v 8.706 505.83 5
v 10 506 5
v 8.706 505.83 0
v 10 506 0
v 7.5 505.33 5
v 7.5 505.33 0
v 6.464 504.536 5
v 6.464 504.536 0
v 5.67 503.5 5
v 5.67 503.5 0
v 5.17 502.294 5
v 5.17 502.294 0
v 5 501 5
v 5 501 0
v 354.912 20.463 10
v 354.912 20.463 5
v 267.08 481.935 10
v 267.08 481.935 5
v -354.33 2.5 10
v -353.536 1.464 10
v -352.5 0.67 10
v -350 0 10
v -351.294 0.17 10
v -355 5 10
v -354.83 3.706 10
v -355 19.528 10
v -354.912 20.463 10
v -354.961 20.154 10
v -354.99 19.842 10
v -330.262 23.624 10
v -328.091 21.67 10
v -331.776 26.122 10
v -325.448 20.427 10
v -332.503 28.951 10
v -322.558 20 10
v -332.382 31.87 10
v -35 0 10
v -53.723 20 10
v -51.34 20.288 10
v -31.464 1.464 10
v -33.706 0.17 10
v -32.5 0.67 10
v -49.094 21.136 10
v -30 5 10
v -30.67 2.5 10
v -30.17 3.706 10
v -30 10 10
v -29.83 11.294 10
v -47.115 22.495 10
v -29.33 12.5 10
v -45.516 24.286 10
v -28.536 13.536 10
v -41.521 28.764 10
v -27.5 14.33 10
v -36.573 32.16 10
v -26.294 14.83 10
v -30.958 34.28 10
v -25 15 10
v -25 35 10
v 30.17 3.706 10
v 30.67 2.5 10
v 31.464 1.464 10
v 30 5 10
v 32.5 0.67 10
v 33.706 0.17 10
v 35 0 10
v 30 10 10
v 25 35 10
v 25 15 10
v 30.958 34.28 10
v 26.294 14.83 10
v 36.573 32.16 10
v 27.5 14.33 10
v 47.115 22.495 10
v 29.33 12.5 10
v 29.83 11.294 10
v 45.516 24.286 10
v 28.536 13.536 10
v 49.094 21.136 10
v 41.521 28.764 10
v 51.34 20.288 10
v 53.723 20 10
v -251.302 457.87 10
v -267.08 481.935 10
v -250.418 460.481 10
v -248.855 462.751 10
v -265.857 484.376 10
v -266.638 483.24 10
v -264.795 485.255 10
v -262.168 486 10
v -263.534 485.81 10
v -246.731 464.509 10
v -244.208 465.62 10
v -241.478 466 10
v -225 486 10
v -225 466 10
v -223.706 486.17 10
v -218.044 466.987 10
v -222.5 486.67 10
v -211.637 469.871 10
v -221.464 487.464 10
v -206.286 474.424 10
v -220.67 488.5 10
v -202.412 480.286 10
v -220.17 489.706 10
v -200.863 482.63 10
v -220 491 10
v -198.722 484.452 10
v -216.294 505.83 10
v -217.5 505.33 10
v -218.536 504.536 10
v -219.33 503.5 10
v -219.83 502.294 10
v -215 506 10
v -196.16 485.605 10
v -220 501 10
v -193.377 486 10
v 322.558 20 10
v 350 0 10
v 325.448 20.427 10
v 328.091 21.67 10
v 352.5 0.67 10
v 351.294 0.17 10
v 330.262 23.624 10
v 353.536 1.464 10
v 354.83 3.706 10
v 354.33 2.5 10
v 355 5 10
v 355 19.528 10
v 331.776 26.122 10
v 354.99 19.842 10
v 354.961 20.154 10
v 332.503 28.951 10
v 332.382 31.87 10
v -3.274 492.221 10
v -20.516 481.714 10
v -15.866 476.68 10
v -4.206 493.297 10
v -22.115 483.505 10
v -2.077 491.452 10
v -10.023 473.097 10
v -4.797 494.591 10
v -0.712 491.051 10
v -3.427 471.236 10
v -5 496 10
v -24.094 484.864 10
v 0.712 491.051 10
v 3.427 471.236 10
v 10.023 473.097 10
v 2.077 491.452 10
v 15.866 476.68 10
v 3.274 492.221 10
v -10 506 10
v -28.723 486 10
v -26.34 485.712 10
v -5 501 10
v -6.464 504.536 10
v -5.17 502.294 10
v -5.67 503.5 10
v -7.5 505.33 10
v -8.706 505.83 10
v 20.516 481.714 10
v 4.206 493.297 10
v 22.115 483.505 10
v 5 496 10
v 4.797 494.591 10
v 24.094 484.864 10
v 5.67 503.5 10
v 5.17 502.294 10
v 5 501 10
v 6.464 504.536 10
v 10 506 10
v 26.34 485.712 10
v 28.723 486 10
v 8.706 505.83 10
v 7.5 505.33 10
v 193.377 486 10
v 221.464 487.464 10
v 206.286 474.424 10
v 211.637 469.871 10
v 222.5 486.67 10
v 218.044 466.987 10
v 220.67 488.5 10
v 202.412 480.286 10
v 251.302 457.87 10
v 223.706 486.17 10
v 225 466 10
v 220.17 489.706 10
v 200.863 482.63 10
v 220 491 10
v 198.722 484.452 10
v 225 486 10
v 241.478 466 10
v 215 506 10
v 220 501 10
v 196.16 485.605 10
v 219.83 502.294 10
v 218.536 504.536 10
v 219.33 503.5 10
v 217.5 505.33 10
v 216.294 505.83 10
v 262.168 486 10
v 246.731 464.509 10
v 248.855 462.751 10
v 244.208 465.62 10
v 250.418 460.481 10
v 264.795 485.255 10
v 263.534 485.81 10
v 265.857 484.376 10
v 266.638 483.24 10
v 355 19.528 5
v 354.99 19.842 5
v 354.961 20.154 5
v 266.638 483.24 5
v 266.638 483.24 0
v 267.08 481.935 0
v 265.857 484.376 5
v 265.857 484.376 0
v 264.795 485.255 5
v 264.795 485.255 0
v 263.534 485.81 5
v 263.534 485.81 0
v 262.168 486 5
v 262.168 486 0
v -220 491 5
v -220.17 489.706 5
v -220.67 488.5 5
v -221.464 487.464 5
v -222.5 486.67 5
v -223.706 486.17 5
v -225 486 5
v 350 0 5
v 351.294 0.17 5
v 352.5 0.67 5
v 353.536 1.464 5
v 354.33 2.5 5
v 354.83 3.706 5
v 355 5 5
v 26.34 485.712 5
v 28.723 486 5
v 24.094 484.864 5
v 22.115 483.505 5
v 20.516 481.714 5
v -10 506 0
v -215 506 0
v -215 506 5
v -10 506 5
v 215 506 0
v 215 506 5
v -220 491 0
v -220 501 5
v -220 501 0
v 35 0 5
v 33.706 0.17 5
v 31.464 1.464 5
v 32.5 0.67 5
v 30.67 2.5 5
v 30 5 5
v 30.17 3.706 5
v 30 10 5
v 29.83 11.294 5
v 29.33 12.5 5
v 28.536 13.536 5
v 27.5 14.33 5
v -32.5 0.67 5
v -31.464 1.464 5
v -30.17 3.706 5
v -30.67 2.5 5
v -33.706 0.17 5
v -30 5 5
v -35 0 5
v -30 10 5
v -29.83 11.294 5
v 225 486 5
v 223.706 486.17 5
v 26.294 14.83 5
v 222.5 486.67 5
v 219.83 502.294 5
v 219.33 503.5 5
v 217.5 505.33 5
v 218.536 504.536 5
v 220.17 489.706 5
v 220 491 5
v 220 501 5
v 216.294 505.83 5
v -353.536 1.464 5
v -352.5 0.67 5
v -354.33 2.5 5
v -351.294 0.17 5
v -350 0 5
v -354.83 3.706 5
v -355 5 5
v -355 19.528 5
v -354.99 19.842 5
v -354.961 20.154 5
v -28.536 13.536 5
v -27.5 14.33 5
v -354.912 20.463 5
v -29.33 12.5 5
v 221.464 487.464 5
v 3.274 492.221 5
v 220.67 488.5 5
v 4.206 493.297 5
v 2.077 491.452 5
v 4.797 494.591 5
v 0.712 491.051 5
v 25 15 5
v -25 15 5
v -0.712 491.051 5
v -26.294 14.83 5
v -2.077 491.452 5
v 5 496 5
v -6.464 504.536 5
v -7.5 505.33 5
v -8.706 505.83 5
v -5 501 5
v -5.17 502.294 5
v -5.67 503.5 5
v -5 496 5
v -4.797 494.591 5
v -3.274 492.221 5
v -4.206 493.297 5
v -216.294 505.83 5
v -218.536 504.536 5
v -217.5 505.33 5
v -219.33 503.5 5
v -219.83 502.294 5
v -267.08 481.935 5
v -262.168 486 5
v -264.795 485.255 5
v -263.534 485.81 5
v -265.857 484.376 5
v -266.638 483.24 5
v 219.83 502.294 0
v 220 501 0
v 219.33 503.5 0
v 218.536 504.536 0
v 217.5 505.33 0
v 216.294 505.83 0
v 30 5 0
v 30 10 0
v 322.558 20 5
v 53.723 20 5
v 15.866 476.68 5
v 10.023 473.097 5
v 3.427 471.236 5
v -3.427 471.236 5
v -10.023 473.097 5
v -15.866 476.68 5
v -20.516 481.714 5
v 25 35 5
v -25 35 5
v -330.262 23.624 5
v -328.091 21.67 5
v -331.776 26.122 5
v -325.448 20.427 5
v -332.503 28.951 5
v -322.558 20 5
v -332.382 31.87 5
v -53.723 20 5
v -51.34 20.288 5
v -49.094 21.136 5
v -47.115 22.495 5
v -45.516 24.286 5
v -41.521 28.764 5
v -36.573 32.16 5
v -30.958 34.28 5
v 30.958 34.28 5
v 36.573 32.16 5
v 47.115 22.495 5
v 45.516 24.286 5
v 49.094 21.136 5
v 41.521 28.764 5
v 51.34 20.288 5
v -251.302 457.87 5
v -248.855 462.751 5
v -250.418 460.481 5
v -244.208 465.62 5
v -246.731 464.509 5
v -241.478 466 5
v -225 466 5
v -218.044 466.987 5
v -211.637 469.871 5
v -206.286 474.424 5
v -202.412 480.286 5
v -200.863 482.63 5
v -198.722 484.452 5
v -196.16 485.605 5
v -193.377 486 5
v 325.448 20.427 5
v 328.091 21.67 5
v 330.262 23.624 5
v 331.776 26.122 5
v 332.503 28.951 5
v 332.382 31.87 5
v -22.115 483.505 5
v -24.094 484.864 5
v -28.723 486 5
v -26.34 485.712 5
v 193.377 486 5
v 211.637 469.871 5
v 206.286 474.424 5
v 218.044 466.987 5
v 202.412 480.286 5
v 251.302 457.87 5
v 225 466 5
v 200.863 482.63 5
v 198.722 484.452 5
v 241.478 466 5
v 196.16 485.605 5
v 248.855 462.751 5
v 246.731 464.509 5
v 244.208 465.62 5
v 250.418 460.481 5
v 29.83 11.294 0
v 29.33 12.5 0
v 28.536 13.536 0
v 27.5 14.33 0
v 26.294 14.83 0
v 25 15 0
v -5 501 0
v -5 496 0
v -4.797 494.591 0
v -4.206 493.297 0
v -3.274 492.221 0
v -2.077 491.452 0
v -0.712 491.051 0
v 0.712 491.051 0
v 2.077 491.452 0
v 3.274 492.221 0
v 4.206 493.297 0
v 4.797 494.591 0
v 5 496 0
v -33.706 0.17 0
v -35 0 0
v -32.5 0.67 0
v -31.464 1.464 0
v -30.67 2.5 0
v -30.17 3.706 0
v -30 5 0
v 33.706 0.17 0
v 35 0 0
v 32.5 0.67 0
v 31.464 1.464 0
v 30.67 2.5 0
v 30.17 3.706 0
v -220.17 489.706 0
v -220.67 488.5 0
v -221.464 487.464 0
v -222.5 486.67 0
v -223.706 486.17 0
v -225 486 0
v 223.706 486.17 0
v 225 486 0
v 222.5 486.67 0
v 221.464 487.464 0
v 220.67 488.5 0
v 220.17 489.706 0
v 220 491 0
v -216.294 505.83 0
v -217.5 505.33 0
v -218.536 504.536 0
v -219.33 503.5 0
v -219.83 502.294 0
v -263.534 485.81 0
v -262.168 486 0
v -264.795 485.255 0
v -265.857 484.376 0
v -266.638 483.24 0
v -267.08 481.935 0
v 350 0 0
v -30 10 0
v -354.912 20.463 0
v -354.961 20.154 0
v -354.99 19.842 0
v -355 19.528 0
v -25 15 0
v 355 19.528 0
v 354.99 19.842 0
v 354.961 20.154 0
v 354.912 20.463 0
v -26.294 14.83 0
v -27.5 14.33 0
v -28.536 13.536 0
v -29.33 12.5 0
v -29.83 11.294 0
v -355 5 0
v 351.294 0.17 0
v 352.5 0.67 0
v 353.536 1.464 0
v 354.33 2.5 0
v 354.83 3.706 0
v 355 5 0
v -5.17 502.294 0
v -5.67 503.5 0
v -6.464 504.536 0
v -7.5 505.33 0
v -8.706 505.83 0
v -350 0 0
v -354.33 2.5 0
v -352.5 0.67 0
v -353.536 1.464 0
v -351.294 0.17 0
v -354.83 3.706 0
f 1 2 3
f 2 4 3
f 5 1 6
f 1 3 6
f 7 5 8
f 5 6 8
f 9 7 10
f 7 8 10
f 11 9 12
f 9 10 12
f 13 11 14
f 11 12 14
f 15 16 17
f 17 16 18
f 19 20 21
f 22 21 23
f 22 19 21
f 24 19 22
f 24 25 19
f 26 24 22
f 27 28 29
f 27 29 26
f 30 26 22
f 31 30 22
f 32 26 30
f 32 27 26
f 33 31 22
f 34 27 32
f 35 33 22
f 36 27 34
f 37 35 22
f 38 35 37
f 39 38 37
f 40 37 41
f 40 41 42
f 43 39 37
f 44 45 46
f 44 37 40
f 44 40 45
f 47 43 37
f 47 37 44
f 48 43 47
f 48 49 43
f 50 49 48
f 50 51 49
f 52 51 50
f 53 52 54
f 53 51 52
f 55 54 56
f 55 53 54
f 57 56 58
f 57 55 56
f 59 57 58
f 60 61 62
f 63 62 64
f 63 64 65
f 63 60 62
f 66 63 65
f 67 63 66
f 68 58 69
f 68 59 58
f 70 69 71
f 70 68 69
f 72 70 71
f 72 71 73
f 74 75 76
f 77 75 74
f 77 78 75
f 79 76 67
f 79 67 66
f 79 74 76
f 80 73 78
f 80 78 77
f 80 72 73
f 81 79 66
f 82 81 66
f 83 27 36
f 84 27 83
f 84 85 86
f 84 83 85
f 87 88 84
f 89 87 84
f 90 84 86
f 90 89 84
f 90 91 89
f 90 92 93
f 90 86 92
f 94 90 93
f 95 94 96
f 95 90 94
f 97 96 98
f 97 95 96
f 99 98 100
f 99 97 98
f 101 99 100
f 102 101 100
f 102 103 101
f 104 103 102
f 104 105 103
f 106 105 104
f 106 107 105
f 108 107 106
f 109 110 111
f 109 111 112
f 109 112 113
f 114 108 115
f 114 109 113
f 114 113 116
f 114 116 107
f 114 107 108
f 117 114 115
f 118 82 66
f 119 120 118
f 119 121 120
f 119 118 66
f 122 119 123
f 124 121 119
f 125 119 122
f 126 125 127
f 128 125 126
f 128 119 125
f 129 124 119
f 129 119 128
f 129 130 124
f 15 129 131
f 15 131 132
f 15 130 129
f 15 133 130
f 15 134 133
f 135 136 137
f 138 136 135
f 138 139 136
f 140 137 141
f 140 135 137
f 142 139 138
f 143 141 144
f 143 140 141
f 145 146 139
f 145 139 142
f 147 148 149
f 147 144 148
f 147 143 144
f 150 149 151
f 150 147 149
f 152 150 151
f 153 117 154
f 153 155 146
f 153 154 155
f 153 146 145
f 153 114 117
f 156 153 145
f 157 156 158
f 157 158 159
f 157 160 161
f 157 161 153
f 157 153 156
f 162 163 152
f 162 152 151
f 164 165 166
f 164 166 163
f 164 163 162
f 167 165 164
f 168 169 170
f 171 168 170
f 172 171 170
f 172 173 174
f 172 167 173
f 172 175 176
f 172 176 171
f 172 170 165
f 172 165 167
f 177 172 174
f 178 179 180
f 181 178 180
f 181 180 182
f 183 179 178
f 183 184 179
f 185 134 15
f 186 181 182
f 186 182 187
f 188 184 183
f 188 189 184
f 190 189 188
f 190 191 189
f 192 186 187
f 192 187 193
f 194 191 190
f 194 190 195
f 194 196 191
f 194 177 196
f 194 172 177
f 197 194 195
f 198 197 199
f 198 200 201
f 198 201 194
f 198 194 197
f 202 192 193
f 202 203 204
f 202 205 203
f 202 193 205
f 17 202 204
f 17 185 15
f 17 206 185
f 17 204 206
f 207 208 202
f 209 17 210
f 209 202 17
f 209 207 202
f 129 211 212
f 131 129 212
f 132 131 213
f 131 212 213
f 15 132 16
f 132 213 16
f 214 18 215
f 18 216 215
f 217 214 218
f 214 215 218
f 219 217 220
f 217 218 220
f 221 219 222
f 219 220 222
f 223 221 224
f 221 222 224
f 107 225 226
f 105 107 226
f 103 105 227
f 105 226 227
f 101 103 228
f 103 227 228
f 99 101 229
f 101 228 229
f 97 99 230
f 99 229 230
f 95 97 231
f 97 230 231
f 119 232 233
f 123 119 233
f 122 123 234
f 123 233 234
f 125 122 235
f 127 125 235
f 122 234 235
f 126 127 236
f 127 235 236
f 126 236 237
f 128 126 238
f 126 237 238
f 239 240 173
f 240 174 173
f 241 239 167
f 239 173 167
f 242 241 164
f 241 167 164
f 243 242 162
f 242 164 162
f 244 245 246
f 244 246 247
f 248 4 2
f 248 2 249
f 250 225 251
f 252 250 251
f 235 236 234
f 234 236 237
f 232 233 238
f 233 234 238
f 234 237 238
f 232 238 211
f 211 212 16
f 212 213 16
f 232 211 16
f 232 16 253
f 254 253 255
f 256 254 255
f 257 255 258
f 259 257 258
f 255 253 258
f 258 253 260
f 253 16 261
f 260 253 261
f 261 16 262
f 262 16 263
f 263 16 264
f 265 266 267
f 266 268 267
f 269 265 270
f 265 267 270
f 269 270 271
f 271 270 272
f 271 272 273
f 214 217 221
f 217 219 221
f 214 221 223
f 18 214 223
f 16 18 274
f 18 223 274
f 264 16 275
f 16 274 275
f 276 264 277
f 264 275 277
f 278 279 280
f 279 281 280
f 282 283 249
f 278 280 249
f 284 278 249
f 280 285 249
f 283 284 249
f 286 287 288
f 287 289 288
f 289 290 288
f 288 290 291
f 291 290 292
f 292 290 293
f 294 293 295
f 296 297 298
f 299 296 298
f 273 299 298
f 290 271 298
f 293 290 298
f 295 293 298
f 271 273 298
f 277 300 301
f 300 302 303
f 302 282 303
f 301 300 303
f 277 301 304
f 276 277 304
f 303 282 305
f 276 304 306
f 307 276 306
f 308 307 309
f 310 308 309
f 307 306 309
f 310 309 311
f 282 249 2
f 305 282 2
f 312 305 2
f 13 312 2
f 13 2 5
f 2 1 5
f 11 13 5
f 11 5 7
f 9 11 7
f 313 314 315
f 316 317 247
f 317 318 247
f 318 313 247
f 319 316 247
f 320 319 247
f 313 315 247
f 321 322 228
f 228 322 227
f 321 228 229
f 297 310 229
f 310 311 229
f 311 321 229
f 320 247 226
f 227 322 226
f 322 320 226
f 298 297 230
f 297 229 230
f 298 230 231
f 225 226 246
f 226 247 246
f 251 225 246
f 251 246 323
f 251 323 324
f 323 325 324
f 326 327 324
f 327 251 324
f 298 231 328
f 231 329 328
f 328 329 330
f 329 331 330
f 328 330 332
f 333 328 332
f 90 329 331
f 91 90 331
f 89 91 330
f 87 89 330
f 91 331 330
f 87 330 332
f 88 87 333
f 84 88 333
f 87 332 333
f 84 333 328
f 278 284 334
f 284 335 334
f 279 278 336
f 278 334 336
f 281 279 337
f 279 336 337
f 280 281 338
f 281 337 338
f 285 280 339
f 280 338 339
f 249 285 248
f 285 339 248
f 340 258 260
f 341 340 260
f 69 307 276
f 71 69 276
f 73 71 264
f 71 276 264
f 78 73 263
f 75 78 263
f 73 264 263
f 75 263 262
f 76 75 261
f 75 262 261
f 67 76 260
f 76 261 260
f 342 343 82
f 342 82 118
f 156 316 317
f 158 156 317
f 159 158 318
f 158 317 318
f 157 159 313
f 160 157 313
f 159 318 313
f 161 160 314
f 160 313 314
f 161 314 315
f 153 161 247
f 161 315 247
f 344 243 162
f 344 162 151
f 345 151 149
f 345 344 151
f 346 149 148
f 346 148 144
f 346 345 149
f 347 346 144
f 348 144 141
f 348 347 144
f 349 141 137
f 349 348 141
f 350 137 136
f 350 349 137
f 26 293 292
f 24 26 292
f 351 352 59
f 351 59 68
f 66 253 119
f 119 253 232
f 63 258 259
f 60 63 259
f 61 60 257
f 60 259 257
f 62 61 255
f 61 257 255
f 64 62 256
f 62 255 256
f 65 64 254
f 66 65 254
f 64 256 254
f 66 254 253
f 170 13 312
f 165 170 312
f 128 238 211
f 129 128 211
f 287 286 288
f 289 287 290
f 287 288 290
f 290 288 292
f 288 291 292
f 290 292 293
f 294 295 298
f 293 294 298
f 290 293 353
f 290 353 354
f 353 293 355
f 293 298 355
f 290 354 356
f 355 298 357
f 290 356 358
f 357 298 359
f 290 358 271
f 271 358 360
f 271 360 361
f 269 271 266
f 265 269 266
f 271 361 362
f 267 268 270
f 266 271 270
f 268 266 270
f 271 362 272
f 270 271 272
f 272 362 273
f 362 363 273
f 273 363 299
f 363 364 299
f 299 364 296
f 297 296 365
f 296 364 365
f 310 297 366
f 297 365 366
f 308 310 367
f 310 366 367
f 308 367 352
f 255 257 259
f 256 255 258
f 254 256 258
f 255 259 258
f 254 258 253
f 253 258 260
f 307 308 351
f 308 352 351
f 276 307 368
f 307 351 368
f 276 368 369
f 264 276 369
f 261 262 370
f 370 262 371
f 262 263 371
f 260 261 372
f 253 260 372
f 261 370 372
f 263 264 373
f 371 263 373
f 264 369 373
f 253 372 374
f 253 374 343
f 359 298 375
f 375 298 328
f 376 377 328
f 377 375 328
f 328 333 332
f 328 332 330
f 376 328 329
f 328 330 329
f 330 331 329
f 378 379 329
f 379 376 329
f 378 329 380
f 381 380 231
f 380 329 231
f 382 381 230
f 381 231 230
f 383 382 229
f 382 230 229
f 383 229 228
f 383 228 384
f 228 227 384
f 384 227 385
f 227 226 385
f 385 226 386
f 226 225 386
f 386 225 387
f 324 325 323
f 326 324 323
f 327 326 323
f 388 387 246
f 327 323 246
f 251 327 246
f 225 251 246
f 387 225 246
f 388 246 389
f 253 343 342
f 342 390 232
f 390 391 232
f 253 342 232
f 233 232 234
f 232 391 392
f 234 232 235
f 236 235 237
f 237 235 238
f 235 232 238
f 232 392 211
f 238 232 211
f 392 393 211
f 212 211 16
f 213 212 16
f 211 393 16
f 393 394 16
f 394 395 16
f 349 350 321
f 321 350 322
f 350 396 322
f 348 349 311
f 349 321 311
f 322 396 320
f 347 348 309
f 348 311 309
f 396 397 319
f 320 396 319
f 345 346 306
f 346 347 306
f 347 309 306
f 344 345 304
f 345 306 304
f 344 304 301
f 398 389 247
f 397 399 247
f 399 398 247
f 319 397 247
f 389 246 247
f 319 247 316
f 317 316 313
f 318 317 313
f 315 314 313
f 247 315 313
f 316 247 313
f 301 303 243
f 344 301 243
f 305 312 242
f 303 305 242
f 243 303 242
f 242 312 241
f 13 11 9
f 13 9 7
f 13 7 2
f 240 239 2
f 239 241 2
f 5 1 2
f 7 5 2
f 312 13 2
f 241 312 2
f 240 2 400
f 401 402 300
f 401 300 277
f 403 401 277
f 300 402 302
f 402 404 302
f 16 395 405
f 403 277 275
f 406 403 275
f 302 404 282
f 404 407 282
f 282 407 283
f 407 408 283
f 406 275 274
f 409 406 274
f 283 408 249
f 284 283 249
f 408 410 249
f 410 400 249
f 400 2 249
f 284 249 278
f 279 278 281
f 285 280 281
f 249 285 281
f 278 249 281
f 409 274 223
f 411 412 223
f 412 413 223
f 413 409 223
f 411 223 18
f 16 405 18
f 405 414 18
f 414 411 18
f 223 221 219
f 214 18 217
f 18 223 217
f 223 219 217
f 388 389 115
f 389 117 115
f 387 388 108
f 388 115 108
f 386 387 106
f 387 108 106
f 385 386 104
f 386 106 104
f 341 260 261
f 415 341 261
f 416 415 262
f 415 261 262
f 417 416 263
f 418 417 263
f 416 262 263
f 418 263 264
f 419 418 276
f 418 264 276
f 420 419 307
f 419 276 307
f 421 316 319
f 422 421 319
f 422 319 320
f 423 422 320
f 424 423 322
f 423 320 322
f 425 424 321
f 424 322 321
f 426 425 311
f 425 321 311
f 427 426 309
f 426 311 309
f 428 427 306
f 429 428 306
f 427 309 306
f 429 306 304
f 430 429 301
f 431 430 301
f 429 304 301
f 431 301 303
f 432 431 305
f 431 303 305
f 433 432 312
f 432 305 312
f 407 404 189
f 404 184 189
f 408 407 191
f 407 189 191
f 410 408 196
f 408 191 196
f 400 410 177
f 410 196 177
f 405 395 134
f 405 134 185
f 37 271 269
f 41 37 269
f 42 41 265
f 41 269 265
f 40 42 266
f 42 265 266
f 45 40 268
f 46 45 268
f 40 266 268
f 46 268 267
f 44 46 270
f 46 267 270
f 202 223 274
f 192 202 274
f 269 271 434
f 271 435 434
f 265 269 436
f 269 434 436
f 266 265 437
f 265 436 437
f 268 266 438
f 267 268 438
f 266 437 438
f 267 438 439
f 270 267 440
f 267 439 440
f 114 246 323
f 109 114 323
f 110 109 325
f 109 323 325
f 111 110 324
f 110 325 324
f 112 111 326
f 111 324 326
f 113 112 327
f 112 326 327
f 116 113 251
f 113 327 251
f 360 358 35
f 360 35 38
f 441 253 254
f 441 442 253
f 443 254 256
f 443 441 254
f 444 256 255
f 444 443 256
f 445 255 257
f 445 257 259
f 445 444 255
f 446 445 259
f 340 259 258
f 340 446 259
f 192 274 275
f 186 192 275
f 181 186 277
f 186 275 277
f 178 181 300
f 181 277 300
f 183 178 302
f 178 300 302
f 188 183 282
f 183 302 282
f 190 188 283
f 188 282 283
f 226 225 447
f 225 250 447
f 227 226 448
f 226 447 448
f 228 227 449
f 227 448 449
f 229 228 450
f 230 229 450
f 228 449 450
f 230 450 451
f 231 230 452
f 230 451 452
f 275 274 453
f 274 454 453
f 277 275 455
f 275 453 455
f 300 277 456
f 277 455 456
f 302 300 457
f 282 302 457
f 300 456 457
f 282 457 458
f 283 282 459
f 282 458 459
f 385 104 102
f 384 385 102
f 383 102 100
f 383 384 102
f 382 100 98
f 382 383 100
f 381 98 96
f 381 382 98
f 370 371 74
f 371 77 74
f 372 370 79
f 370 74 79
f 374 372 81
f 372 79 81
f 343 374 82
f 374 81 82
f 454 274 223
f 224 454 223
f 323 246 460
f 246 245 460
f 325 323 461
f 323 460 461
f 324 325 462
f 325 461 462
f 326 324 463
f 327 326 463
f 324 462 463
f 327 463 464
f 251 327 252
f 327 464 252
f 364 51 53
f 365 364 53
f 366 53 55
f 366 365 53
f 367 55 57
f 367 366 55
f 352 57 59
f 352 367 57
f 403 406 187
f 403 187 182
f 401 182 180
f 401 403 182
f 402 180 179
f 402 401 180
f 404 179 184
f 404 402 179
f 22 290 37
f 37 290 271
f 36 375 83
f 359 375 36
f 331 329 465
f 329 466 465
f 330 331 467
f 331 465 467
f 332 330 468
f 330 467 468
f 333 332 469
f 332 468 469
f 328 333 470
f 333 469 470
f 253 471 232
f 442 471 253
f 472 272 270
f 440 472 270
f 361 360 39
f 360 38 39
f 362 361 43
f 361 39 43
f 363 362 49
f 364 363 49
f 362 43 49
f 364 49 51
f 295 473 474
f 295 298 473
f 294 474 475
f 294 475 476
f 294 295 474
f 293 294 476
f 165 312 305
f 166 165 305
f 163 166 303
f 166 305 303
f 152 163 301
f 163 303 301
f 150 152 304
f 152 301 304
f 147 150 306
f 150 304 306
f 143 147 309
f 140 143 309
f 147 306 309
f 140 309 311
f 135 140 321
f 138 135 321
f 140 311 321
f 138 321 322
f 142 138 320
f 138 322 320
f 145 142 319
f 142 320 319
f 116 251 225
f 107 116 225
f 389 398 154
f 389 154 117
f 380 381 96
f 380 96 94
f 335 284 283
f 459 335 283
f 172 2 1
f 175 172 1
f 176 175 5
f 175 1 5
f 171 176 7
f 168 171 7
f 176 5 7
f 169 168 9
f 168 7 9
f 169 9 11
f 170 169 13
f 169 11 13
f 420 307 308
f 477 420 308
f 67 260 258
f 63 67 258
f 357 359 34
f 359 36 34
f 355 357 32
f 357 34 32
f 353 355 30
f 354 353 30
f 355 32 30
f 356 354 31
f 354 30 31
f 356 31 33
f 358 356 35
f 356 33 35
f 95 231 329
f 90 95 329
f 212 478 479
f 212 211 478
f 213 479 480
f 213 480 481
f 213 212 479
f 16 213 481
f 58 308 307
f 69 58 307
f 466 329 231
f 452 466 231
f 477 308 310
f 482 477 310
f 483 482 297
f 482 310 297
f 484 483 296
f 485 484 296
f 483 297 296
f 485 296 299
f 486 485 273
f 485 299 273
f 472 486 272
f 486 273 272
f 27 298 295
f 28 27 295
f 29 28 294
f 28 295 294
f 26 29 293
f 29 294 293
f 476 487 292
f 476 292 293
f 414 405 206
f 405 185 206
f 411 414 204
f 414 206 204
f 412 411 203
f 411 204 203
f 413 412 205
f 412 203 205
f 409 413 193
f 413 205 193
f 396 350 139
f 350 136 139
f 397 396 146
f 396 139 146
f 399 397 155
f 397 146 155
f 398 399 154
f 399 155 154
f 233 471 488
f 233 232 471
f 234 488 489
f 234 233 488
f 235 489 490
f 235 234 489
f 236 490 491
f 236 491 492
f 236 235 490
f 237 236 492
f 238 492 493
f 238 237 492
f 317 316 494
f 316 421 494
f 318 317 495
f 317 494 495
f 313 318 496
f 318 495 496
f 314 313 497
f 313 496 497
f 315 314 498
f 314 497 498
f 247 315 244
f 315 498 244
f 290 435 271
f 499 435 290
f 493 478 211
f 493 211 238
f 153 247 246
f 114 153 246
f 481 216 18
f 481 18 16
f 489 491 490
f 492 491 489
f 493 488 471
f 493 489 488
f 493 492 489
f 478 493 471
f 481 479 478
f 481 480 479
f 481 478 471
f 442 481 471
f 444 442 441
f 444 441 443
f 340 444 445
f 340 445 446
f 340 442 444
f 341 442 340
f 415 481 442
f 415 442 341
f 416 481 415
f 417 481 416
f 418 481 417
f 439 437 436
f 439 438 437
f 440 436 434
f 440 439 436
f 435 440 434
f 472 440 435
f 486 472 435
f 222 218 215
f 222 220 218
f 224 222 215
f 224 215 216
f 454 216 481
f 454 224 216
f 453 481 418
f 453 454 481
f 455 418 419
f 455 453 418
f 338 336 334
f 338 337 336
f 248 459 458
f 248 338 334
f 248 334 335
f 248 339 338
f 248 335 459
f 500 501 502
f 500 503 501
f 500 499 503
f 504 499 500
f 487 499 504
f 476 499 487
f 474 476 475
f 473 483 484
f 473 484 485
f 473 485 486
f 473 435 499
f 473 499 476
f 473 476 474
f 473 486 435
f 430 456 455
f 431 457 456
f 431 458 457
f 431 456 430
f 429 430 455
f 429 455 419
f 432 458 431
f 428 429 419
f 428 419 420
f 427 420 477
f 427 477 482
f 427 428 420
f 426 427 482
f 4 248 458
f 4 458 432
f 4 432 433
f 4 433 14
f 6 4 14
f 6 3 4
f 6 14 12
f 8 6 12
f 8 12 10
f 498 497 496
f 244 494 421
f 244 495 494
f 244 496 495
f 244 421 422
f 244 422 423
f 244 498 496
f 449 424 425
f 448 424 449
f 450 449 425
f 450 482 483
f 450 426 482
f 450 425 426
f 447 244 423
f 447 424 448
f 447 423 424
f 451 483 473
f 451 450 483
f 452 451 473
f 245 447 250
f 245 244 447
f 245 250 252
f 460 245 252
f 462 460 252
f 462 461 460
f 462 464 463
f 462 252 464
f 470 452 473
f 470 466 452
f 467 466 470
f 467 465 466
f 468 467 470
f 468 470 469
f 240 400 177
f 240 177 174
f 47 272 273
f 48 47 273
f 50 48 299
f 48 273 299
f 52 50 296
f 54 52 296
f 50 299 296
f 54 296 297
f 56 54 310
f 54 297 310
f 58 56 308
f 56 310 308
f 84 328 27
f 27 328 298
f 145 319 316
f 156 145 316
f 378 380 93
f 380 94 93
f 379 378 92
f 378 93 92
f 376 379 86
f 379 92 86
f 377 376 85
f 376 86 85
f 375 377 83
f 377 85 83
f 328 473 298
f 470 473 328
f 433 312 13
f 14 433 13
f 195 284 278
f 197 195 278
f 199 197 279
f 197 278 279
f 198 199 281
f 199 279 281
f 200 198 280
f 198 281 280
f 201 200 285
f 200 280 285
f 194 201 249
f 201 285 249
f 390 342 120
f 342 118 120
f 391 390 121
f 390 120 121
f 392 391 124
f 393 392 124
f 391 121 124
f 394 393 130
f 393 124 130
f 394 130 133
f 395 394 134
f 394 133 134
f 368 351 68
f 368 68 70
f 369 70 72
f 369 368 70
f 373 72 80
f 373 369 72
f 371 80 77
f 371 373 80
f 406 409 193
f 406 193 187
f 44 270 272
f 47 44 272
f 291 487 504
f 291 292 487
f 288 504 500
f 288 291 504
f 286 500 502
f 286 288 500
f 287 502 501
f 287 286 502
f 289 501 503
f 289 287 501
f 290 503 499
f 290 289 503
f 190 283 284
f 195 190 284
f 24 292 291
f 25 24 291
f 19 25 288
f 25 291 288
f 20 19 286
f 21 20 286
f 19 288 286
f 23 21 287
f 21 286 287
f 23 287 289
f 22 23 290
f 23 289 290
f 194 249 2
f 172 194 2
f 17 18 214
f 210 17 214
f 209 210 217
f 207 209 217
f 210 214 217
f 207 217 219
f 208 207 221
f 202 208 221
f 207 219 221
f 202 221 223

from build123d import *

# Parameters (mm, degrees)
EXTRUDE_1_DEPTH     = 5
CUT_EXTRUDE_1_DEPTH = 619.131054065
FILLET_1_R          = 5
EXTRUDE_2_DEPTH     = 5
FILLET_2_R          = 10


with BuildPart() as part:
    # ｽｹｯﾁ2 → ﾎﾞｽ - 押し出し1 (new body)
    with BuildSketch(Plane.XY):
        Polygon((355, 0), (-355, 0), (-355, 20), (-262.5, 506), (262.5, 506), (355, 20), align=None)
    extrude(amount=EXTRUDE_1_DEPTH)

    # ｽｹｯﾁ3 → ｶｯﾄ - 押し出し1 (cut, through all)
    with BuildSketch(Plane.XY.offset(5)):
        Polygon((-262.5, 506), (-266.306584362, 486), (-220, 486), (-220, 506), align=None)
        Polygon((262.5, 506), (220, 506), (220, 486), (266.306584362, 486), align=None)
        with BuildLine():
            Line((5, 506), (-5, 506))
            Line((-5, 506), (-5, 496))
            ThreePointArc((-5, 496), (0, 491), (5, 496))
            Line((5, 496), (5, 506))
        make_face()
        with BuildLine():
            Line((-30, 10), (-30, 0))
            Line((-30, 0), (30, 0))
            Line((30, 0), (30, 10))
            ThreePointArc((30, 10), (28.535533906, 13.535533906), (25, 15))
            Line((25, 15), (-25, 15))
            ThreePointArc((-25, 15), (-28.535533906, 13.535533906), (-30, 10))
        make_face()
    extrude(amount=-CUT_EXTRUDE_1_DEPTH, mode=Mode.SUBTRACT)

    # ﾌｨﾚｯﾄ1
    fillet_1_edges = [part.edges().sort_by_distance(p)[0] for p in [
        (-355, 20, 2.5),
        (355, 20, 2.5),
        (355, 0, 2.5),
        (-355, 0, 2.5),
        (-220, 486, 2.5),
        (-266.306584362, 486, 2.5),
        (-220, 506, 2.5),
        (266.306584362, 486, 2.5),
        (220, 486, 2.5),
        (220, 506, 2.5),
        (-5, 506, 2.5),
        (5, 506, 2.5),
        (30, 0, 2.5),
        (-30, 0, 2.5),
    ]]
    fillet(fillet_1_edges, radius=FILLET_1_R)


with BuildPart() as body_2:
    # ｽｹｯﾁ4 → ﾎﾞｽ - 押し出し2 (new body)
    with BuildSketch(Plane.XY.offset(5)):
        with BuildLine():
            Line((30, 10), (30, 5))
            ThreePointArc((30, 5), (31.464466094, 1.464466094), (35, 0))
            Line((35, 0), (350, 0))
            ThreePointArc((350, 0), (353.535533906, 1.464466094), (355, 5))
            Line((355, 5), (355, 19.528409825))
            ThreePointArc((355, 19.528409825), (354.977907561, 19.997916285), (354.911825474, 20.463273727))
            Line((354.911825474, 20.463273727), (267.080298537, 481.934863902))
            ThreePointArc((267.080298537, 481.934863902), (265.356394054, 484.851903394), (262.168473063, 486))
            Line((262.168473063, 486), (225, 486))
            ThreePointArc((225, 486), (221.464466094, 487.464466094), (220, 491))
            Line((220, 491), (220, 501))
            ThreePointArc((220, 501), (218.535533906, 504.535533906), (215, 506))
            Line((215, 506), (10, 506))
            ThreePointArc((10, 506), (6.464466094, 504.535533906), (5, 501))
            Line((5, 501), (5, 496))
            ThreePointArc((5, 496), (0, 491), (-5, 496))
            Line((-5, 496), (-5, 501))
            ThreePointArc((-5, 501), (-6.464466094, 504.535533906), (-10, 506))
            Line((-10, 506), (-215, 506))
            ThreePointArc((-215, 506), (-218.535533906, 504.535533906), (-220, 501))
            Line((-220, 501), (-220, 491))
            ThreePointArc((-220, 491), (-221.464466094, 487.464466094), (-225, 486))
            Line((-225, 486), (-262.168473063, 486))
            ThreePointArc((-262.168473063, 486), (-265.356394054, 484.851903394), (-267.080298537, 481.934863902))
            Line((-267.080298537, 481.934863902), (-354.911825474, 20.463273727))
            ThreePointArc((-354.911825474, 20.463273727), (-354.977907561, 19.997916285), (-355, 19.528409825))
            Line((-355, 19.528409825), (-355, 5))
            ThreePointArc((-355, 5), (-353.535533906, 1.464466094), (-350, 0))
            Line((-350, 0), (-35, 0))
            ThreePointArc((-35, 0), (-31.464466094, 1.464466094), (-30, 5))
            Line((-30, 5), (-30, 10))
            ThreePointArc((-30, 10), (-28.535533906, 13.535533906), (-25, 15))
            Line((-25, 15), (25, 15))
            ThreePointArc((25, 15), (28.535533906, 13.535533906), (30, 10))
        make_face()
        with BuildLine():
            Line((-225, 466), (-249.754139167, 466))
            Line((-249.754139167, 466), (-334.640970443, 20))
            Line((-334.640970443, 20), (-47.912878475, 20))
            ThreePointArc((-47.912878475, 20), (-38.693063938, 30.916500663), (-25, 35))
            Line((-25, 35), (25, 35))
            ThreePointArc((25, 35), (38.693063938, 30.916500663), (47.912878475, 20))
            Line((47.912878475, 20), (334.640970443, 20))
            Line((334.640970443, 20), (249.754139167, 466))
            Line((249.754139167, 466), (225, 466))
            ThreePointArc((225, 466), (209.188611699, 471.635083269), (200.505102572, 486))
            Line((200.505102572, 486), (22.912878475, 486))
            ThreePointArc((22.912878475, 486), (0, 471), (-22.912878475, 486))
            Line((-22.912878475, 486), (-200.505102572, 486))
            ThreePointArc((-200.505102572, 486), (-209.188611699, 471.635083269), (-225, 466))
        make_face(mode=Mode.SUBTRACT)
    extrude(amount=EXTRUDE_2_DEPTH)

    # ﾌｨﾚｯﾄ2
    fillet_2_edges = [body_2.edges().sort_by_distance(p)[0] for p in [
        (-200.505102572, 486, 7.5),
        (-249.754139167, 466, 7.5),
        (-334.640970443, 20, 7.5),
        (-47.912878475, 20, 7.5),
        (47.912878475, 20, 7.5),
        (334.640970443, 20, 7.5),
        (249.754139167, 466, 7.5),
        (200.505102572, 486, 7.5),
        (22.912878475, 486, 7.5),
        (-22.912878475, 486, 7.5),
    ]]
    fillet(fillet_2_edges, radius=FILLET_2_R)


solid = Compound([part.part, body_2.part])
